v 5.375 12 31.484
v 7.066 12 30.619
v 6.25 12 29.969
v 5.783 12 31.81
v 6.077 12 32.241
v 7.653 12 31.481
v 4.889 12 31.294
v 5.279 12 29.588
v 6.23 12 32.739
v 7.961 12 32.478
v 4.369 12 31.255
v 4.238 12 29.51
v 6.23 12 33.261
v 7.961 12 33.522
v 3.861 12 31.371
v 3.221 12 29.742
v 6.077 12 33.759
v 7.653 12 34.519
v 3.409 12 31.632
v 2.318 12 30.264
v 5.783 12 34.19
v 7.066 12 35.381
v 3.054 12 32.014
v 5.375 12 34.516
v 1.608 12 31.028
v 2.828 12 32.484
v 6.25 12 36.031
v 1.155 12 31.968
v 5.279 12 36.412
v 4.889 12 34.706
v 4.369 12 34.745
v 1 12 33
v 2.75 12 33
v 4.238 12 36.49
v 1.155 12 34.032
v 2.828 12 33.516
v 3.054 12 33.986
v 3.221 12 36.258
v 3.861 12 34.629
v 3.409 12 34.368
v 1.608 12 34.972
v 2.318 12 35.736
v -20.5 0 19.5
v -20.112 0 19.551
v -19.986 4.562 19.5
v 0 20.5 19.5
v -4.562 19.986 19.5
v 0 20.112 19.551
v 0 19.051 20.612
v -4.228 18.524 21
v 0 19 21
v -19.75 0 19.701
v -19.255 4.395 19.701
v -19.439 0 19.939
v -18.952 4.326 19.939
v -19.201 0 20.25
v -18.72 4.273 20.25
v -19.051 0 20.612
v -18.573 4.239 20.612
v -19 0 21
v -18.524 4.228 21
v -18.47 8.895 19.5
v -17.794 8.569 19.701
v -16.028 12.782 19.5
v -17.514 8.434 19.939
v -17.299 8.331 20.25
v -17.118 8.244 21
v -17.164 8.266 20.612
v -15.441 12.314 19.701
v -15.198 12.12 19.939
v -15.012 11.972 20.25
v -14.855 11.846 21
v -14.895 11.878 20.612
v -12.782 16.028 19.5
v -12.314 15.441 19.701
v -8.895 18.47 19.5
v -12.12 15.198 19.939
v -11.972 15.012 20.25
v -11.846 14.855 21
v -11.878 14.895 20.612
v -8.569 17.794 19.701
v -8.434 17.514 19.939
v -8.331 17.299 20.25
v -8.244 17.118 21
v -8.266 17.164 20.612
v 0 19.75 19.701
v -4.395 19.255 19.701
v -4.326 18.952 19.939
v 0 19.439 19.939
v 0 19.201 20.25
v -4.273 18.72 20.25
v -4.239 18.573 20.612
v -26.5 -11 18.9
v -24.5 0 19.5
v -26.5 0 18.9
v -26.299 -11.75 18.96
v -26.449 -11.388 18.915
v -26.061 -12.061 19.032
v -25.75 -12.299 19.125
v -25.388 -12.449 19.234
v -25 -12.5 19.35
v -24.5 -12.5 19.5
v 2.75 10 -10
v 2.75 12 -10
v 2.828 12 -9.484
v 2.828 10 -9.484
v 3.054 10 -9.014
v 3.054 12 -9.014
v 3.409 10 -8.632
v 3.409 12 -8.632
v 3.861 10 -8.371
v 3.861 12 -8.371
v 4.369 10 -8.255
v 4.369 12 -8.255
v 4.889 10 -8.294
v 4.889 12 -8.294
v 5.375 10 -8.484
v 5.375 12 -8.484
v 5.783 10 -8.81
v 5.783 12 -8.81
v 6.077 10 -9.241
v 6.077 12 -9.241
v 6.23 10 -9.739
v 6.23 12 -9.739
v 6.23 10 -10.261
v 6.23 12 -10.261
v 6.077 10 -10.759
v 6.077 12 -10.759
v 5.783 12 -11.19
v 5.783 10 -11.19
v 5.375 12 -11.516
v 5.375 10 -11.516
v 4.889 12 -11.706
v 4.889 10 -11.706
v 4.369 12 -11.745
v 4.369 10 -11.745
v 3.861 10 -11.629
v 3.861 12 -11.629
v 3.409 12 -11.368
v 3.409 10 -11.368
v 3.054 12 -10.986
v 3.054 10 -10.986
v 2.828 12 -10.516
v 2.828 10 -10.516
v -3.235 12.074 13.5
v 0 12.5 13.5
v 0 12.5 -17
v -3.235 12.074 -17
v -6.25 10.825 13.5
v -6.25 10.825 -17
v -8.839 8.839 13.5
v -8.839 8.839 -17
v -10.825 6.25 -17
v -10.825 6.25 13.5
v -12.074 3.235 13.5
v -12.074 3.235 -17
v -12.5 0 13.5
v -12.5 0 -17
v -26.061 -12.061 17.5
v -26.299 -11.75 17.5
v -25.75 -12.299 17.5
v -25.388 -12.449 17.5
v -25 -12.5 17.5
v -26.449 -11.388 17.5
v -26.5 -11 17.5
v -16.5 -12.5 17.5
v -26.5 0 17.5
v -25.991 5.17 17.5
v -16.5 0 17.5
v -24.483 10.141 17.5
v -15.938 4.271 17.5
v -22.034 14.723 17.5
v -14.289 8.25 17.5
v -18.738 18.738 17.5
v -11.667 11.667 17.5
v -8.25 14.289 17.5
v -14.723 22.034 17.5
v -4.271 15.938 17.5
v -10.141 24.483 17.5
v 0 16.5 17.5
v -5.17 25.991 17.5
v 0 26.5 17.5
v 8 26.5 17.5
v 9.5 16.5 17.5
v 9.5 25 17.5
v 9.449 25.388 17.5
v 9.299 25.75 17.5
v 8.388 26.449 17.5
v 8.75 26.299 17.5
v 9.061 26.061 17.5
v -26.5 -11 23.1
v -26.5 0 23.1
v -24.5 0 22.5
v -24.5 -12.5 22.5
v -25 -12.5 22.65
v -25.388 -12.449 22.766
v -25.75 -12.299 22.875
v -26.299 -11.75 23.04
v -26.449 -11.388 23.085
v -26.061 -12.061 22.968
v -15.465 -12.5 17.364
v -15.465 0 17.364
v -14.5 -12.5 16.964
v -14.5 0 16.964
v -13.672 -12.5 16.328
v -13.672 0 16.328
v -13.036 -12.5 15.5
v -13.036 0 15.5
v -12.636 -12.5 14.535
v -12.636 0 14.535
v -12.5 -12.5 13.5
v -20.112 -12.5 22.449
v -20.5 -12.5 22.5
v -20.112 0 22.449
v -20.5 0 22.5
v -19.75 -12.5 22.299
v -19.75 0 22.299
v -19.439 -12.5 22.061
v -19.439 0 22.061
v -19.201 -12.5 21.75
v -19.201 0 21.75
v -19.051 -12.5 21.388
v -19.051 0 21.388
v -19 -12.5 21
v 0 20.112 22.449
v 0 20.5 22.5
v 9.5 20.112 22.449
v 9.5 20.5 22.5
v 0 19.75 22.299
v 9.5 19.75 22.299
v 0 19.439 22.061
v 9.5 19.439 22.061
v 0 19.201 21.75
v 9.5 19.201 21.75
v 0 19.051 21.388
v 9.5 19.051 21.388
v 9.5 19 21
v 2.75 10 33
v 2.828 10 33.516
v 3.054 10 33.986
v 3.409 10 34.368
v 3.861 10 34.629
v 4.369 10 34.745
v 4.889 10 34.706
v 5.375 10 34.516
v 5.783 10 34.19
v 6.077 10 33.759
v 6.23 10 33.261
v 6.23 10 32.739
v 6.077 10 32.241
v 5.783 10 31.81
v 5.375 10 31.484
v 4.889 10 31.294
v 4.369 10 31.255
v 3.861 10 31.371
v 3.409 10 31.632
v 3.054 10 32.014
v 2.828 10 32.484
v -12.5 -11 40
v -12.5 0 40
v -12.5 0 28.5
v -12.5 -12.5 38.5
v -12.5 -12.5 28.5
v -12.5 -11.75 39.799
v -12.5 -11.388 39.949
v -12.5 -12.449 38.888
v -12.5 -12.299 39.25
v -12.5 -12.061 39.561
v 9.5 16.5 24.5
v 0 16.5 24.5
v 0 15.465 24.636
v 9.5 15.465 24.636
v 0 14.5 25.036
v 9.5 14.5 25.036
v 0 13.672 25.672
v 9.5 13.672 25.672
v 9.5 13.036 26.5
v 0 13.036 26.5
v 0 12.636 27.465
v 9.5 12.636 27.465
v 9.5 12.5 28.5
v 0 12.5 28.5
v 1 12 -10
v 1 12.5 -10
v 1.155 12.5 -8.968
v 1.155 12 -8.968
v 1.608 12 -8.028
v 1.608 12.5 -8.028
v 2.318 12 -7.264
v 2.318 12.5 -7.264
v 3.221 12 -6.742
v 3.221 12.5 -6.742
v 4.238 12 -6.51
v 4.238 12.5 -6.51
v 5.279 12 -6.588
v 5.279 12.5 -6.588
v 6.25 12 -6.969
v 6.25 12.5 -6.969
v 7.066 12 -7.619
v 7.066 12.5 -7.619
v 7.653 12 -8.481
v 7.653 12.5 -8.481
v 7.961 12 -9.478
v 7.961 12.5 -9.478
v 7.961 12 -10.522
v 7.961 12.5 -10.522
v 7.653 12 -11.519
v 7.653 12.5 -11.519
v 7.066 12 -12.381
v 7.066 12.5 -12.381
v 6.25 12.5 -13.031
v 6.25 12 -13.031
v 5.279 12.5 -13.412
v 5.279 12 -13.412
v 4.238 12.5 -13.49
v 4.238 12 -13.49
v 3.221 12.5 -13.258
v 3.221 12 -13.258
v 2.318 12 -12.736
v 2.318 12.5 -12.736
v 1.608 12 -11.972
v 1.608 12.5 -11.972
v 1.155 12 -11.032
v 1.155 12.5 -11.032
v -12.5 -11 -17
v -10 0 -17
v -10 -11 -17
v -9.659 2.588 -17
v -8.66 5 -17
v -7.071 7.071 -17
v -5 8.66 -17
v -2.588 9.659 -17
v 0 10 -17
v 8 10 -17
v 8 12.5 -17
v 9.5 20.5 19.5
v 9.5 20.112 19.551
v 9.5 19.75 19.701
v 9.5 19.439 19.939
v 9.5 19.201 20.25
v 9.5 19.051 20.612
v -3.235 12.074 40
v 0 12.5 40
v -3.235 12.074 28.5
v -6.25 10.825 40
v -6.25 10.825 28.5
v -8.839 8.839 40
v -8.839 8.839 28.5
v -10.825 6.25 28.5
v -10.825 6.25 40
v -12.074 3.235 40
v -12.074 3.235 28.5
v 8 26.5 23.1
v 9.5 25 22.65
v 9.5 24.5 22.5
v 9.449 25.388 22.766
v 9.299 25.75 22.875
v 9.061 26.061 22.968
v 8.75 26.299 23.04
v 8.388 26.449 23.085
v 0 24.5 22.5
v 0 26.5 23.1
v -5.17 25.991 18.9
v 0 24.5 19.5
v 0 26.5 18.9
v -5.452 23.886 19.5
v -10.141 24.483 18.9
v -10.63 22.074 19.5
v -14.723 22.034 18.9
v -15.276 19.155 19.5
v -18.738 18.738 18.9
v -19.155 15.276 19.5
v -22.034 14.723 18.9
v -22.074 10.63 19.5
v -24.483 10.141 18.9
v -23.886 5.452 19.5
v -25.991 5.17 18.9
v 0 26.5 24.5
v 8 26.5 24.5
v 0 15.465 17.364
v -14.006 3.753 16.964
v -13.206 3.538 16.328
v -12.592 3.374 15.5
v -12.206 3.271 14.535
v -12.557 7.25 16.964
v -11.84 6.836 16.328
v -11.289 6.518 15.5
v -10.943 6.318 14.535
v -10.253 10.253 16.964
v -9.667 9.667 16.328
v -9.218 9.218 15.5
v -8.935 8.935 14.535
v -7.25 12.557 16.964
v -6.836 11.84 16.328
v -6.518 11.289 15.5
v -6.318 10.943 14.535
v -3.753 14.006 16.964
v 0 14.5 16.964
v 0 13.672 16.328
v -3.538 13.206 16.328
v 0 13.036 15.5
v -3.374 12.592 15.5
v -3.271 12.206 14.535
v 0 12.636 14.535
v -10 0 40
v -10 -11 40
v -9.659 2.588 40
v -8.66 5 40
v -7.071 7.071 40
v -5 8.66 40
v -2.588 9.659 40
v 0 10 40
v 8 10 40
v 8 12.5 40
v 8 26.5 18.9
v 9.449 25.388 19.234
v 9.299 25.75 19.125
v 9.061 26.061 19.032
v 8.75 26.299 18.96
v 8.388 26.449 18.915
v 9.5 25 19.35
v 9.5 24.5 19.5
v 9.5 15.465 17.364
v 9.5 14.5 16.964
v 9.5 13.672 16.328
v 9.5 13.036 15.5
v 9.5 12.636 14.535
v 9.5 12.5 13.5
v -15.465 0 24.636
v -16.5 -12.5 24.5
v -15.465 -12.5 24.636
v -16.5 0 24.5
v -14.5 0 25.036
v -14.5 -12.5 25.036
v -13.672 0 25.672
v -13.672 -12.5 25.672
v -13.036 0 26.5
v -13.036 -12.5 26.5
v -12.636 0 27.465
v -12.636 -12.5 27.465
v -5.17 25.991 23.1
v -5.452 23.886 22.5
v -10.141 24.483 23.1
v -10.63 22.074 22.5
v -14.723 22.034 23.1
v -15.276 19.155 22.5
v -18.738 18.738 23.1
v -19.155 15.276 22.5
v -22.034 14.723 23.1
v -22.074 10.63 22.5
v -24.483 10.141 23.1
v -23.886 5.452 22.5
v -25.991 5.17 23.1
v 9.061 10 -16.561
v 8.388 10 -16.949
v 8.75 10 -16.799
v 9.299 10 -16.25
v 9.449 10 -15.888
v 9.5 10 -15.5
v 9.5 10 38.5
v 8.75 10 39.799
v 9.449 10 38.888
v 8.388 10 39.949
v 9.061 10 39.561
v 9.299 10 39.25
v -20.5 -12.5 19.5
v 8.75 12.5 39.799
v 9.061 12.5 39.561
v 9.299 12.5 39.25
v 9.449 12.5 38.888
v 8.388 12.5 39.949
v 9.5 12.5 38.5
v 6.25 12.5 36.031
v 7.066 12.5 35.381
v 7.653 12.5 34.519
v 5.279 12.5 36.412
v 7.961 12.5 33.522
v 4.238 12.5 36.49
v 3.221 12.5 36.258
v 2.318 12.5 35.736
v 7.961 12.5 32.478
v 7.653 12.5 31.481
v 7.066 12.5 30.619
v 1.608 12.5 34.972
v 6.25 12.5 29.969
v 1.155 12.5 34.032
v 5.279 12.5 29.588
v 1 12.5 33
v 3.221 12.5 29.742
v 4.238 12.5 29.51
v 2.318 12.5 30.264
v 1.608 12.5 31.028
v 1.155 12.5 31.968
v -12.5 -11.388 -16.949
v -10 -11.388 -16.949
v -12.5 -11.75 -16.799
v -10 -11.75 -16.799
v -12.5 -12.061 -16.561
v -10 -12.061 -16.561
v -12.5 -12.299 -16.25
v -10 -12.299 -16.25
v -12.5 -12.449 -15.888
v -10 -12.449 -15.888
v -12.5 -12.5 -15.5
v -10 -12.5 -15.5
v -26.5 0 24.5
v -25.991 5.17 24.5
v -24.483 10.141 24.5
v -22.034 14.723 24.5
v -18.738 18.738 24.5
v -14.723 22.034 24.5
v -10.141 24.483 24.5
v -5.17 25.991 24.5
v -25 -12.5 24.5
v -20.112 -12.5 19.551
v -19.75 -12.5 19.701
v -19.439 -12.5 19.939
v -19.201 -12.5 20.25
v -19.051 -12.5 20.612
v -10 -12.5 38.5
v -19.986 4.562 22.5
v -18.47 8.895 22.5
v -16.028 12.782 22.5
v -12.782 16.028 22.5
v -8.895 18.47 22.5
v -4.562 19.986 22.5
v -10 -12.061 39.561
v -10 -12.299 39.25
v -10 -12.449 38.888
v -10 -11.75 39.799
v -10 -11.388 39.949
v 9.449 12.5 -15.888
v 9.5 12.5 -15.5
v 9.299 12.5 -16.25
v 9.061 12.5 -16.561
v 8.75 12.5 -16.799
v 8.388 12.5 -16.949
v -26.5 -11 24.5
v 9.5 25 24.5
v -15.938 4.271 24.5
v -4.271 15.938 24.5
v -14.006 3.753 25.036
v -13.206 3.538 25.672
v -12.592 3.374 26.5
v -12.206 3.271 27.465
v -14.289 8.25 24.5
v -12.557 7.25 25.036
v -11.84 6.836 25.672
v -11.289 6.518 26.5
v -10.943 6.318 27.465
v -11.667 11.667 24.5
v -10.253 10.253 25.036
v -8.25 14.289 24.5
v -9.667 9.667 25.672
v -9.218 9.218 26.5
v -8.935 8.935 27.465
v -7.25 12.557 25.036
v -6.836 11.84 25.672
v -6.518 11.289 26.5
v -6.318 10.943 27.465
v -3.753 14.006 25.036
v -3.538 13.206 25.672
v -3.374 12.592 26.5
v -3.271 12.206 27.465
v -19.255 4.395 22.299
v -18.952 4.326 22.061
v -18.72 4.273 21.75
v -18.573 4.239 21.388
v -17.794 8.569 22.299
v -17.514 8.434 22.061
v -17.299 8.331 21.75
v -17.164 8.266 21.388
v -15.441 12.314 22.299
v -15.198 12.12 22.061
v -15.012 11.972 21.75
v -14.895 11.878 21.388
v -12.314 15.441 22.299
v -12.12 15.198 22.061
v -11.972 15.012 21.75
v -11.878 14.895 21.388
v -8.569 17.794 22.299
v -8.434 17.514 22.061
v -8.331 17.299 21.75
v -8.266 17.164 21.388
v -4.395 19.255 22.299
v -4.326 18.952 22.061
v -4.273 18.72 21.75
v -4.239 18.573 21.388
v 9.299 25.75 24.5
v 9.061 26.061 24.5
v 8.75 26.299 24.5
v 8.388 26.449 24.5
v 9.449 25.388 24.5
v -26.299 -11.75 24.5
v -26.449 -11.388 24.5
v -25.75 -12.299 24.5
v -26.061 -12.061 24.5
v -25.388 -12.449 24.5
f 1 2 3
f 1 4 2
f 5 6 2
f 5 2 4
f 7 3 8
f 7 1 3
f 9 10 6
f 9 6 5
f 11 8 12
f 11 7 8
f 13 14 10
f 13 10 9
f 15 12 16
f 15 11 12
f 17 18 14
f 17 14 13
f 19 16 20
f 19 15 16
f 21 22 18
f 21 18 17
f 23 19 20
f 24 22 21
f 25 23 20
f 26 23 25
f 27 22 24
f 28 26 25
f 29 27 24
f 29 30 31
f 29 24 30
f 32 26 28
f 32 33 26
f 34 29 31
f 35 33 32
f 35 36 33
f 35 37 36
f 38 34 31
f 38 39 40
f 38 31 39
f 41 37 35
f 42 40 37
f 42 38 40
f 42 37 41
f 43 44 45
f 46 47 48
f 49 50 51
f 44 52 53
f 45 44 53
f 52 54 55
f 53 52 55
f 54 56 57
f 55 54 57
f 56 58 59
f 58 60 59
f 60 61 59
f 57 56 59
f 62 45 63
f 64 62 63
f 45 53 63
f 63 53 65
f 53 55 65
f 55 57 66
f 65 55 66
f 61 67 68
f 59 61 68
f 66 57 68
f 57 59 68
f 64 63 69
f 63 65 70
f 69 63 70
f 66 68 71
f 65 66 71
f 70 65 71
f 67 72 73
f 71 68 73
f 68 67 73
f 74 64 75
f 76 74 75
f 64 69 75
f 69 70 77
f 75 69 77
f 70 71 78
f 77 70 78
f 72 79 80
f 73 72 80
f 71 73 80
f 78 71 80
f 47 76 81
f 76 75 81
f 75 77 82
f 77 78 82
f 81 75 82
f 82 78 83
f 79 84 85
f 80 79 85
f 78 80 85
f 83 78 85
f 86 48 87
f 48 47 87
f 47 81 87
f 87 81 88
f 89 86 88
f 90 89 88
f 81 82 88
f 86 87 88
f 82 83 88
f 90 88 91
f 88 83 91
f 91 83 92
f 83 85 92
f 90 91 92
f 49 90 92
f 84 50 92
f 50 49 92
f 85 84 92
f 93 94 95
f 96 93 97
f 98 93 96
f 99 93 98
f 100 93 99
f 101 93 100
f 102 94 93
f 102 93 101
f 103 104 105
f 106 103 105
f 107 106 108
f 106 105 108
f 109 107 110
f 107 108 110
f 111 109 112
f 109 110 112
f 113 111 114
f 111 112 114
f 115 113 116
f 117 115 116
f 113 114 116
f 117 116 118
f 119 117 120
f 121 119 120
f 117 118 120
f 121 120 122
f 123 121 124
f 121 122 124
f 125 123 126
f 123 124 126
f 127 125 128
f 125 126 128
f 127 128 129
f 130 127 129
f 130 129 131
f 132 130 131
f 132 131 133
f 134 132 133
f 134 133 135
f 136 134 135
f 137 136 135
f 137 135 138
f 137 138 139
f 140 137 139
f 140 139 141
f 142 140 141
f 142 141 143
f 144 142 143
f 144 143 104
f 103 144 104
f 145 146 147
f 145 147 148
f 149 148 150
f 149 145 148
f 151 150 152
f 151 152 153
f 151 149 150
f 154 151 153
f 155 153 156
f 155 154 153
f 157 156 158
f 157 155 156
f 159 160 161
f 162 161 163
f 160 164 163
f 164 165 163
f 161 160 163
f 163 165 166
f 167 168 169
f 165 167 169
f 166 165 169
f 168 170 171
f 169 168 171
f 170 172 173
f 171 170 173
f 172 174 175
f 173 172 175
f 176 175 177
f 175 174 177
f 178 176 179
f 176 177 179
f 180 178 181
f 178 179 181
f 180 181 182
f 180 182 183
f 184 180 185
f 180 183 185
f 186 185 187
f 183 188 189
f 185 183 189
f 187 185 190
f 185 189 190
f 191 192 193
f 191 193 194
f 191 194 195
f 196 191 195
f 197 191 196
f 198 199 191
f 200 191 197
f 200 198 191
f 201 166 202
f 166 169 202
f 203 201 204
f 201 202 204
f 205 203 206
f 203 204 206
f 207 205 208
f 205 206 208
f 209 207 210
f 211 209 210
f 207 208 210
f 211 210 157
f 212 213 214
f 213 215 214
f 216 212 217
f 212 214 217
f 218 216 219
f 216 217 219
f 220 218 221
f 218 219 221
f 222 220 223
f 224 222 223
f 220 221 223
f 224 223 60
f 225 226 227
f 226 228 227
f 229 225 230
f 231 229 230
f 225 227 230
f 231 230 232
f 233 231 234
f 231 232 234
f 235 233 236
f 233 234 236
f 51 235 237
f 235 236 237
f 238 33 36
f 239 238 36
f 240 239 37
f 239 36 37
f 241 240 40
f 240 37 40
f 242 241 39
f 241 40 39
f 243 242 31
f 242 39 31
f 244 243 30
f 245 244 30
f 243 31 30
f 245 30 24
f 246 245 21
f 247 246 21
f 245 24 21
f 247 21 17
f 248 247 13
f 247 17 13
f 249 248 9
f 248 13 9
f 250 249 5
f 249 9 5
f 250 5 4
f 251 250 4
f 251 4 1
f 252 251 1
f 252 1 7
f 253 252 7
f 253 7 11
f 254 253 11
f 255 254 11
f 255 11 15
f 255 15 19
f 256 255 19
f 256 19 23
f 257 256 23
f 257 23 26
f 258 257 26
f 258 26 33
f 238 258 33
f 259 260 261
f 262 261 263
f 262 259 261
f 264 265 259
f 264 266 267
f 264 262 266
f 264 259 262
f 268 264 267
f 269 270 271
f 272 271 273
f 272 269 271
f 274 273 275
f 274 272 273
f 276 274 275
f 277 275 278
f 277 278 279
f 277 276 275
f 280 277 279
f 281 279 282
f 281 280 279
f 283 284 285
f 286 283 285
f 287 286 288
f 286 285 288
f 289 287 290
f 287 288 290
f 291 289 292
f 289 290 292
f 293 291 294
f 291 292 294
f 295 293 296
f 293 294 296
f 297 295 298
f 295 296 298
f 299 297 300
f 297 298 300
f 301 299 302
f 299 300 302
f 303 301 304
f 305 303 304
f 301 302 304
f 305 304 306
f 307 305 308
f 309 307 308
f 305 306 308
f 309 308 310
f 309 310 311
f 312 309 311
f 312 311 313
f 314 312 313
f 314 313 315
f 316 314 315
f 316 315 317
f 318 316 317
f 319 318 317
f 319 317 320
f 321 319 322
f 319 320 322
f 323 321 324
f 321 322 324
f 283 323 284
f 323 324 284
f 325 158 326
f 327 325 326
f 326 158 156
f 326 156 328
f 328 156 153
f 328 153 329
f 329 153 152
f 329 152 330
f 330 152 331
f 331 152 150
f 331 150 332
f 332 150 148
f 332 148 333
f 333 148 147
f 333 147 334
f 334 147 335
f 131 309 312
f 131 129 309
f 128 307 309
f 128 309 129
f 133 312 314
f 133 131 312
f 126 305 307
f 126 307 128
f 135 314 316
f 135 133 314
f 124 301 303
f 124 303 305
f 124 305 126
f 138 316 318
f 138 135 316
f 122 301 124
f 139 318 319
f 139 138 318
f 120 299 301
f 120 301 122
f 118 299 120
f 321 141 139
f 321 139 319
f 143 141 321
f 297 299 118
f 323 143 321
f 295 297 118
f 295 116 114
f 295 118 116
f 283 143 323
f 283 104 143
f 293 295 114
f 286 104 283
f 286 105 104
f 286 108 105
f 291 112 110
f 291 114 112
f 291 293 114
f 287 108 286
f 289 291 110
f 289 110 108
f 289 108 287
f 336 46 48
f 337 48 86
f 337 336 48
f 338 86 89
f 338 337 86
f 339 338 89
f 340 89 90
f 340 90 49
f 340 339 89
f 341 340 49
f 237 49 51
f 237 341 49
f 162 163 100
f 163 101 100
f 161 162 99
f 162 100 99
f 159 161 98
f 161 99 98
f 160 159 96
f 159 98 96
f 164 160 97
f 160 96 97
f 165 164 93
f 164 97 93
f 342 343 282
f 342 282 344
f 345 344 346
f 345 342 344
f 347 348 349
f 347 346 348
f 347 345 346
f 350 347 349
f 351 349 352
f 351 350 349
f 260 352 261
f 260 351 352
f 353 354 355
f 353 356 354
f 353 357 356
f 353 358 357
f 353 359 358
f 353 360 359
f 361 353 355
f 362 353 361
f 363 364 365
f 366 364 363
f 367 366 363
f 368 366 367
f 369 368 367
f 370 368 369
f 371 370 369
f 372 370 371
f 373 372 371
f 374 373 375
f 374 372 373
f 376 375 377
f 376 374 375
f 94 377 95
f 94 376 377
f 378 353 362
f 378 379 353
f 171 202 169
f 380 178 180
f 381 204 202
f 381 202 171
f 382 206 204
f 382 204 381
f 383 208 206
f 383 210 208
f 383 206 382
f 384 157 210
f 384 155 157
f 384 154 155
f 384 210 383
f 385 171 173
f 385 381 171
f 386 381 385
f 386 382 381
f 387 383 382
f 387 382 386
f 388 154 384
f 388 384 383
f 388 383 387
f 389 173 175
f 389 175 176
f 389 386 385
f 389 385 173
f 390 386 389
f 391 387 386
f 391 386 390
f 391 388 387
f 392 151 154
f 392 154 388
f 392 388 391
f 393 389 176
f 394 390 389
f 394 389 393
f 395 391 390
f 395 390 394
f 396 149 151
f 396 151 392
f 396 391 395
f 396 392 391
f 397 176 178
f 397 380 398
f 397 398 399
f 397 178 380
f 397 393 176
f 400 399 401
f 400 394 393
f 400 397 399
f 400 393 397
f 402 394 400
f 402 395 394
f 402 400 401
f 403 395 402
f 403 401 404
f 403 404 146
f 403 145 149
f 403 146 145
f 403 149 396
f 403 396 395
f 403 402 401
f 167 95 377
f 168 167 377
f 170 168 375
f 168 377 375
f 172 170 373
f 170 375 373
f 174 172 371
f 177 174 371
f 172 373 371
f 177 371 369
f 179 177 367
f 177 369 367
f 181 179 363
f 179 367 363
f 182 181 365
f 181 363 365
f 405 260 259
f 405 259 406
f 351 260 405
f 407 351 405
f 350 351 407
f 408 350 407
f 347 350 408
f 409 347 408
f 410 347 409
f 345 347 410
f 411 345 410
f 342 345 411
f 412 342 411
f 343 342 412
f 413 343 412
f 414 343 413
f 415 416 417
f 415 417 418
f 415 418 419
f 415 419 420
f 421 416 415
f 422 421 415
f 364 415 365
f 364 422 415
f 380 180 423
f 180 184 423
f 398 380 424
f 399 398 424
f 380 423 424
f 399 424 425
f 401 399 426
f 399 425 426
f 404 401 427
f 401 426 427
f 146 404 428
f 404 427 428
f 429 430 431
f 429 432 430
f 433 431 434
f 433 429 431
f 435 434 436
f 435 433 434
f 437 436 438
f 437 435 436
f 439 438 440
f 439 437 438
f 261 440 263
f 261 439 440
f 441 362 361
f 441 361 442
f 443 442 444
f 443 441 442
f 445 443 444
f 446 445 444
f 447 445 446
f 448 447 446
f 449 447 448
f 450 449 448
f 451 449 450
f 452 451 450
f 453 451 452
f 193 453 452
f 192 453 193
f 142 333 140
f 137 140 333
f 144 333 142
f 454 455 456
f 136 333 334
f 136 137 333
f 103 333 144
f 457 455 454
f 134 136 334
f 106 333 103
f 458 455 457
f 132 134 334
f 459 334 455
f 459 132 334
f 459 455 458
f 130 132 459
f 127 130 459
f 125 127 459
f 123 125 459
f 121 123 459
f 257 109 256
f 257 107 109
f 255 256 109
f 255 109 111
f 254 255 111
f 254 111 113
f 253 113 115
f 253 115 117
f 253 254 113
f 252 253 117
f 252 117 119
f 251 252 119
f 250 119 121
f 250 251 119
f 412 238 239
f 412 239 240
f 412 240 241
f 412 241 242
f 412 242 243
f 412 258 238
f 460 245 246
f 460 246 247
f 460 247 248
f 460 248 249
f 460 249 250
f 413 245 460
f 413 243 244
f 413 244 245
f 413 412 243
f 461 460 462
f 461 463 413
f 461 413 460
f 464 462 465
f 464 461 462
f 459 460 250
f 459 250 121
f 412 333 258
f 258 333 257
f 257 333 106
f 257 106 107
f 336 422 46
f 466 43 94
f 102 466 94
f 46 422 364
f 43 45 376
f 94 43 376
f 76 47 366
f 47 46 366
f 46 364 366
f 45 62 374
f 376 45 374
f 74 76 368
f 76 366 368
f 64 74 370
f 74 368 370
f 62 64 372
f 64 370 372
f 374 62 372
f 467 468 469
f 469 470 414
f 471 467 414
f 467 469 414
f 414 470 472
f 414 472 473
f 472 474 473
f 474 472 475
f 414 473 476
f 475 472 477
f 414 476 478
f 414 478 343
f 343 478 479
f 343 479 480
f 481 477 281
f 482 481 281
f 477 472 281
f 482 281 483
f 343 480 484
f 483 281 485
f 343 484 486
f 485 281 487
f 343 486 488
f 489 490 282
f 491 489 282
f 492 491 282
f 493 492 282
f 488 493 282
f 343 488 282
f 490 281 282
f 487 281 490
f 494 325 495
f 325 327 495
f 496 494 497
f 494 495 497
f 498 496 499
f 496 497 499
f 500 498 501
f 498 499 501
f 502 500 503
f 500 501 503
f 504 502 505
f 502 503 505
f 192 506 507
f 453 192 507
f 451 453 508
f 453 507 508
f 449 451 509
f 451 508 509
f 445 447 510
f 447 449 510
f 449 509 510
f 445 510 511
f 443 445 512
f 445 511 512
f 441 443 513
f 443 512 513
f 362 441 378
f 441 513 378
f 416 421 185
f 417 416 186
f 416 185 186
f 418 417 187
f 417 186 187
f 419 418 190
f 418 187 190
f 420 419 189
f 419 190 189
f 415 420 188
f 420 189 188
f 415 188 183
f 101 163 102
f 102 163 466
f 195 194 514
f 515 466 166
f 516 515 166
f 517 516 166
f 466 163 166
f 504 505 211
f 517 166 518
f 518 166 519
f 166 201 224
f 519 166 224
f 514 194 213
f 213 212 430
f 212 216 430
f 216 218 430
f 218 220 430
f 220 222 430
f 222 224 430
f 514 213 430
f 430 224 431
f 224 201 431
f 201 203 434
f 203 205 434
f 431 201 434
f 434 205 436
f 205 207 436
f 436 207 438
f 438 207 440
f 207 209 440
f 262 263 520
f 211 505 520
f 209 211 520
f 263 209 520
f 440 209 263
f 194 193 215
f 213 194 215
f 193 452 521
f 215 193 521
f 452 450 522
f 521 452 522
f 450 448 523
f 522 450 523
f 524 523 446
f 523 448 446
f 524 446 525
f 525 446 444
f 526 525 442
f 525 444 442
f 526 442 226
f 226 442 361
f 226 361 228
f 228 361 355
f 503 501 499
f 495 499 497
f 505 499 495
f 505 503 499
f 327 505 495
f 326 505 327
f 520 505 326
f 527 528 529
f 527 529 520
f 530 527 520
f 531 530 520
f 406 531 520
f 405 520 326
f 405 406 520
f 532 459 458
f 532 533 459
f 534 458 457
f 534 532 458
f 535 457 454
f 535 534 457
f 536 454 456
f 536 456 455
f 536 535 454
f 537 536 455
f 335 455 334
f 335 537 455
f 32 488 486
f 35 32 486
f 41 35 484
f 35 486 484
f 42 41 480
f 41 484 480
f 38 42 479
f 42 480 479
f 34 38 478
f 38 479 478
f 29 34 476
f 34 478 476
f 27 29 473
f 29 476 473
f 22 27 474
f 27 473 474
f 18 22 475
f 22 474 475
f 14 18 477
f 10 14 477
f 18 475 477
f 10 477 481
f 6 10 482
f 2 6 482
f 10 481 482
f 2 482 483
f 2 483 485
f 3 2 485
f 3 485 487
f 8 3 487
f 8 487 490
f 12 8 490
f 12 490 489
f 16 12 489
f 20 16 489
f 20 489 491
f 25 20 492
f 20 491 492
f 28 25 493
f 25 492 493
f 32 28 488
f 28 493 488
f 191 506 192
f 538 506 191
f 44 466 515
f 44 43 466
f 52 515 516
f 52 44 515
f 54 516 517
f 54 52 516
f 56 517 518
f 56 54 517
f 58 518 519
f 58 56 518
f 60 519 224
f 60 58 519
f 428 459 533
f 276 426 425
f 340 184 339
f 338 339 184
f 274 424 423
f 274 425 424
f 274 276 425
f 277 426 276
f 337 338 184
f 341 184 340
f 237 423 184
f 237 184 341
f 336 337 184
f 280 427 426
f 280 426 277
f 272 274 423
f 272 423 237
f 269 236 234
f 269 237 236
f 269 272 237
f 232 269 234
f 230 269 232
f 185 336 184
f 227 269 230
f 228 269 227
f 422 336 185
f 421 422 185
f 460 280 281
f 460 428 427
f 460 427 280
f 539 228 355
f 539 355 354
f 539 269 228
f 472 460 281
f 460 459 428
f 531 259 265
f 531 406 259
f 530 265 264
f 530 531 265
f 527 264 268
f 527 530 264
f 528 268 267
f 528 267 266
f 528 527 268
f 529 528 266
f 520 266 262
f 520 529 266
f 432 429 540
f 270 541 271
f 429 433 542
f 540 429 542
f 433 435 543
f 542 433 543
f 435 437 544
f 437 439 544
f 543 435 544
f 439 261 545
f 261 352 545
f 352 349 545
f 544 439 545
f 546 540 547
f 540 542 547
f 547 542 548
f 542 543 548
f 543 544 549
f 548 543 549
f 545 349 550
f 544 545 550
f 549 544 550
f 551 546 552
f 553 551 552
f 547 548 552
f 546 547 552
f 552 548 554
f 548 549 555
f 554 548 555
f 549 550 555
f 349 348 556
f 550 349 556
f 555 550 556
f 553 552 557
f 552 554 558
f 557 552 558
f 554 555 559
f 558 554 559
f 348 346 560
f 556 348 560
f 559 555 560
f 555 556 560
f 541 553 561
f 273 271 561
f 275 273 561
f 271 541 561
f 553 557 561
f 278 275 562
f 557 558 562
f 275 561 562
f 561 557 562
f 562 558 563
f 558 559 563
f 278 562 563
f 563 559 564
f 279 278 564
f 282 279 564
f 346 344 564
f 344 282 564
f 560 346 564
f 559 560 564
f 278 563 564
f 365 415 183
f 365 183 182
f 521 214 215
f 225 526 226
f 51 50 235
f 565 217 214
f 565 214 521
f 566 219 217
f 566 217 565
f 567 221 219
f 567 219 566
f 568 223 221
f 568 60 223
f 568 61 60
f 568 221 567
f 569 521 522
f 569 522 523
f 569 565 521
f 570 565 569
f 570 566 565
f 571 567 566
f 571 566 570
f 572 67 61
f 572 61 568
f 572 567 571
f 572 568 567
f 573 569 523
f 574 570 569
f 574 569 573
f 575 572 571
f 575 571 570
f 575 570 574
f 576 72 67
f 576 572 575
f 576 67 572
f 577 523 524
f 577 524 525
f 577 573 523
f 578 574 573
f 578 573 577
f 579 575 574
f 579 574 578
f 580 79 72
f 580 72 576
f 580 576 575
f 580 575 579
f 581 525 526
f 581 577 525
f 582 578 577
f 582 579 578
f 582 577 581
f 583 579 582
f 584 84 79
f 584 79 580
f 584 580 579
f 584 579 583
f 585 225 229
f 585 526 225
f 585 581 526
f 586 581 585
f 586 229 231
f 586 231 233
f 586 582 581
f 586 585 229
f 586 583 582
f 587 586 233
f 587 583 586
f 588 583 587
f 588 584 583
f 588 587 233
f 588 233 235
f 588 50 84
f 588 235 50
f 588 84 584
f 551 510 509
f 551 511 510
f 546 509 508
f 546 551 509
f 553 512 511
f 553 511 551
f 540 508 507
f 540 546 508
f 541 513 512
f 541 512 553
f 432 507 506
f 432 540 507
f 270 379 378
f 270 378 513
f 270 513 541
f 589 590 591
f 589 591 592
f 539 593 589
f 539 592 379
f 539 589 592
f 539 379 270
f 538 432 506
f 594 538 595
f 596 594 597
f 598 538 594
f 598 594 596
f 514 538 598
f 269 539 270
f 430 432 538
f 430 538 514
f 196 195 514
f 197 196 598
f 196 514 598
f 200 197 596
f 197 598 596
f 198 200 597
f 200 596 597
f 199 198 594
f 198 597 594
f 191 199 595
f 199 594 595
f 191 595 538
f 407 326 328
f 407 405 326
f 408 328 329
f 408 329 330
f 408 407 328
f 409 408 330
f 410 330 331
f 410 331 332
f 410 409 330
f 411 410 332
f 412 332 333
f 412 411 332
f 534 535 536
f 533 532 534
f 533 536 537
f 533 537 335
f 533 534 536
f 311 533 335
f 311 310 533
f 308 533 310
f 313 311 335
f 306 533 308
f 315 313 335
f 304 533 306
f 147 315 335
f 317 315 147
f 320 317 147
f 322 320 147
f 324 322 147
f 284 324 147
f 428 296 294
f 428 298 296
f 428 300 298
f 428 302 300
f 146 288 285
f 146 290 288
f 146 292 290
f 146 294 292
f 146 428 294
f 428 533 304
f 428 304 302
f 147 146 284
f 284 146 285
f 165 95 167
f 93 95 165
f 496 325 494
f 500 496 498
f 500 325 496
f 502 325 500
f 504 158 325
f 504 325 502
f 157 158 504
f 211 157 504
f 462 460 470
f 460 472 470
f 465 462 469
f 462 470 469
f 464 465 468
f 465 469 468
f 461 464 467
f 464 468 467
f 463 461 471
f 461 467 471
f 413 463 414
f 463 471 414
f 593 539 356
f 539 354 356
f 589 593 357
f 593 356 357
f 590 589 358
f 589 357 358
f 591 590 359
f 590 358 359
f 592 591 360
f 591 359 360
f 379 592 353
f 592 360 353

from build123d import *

# Parameters (mm, degrees)
F1_DEPTH  = 40
F3_DEPTH  = 6.5
F4_DEPTH  = 14
F5_R      = 3.5
F5_R_2    = 1.75
F6_DEPTH  = 0.5
F7_DEPTH  = 25
F8_DEPTH  = 17
F9_R      = 1.75
F10_DEPTH = 3
F9_R_2    = 3.5
F11_DEPTH = 0.5
F12_W     = 12.5
F12_H     = 3
F13_DEPTH = 6.5
F12_H_2   = 2
F14_DEPTH = 14
F15_ANGLE = 90
F16_R     = 4
F17_SIZE2 = 2
F17_SIZE  = 0.6
F18_SIZE2 = 0.6
F18_SIZE  = 2
F19_R     = 1.49999


# Not quite as in the source:
# - a fillet or chamfer is up to 0.001 mm smaller than in the source, because OpenCascade refuses the exact size


with BuildPart() as f1:
    # F0 (on Top) → F1 (new body)
    with BuildSketch(Plane.XY):
        with BuildLine():
            ThreePointArc((-10, 0), (-7.0710678119, 7.0710678119), (0, 10))
            Line((0, 10), (9.5, 10))
            Line((9.5, 10), (9.5, 12.5))
            Line((9.5, 12.5), (0, 12.5))
            ThreePointArc((0, 12.5), (-8.8388347648, 8.8388347648), (-12.5, 0))
            Line((-12.5, 0), (-12.5, -12.5))
            Line((-12.5, -12.5), (-10, -12.5))
            Line((-10, -12.5), (-10, 0))
        make_face()
    extrude(amount=F1_DEPTH)

    # F2 (on face) → F3 (join)
    with BuildSketch(Plane(origin=(0, 12.5, 0), x_dir=(-1, 0, 0), z_dir=(0, 1, 0))):
        Polygon((-5.7388888672, 22.5), (-9.5, 22.5), (-9.5, 19.5), (-5.7327155955, 19.5), (0, 19.5), (0, 22.5), align=None)
    extrude(amount=F3_DEPTH)

    # F2 (on face) → F4 (join)
    with BuildSketch(Plane(origin=(0, 12.5, 0), x_dir=(-1, 0, 0), z_dir=(0, 1, 0))):
        Polygon((-5.7188421488, 24.5), (-9.5, 24.5), (-9.5, 22.5), (-5.7388888672, 22.5), (0, 22.5), (0, 24.5), align=None)
        Polygon((-5.7327155955, 19.5), (-9.5, 19.5), (-9.5, 17.5), (-5.7445626465, 17.5), (0, 17.5), (0, 19.5), align=None)
    extrude(amount=F4_DEPTH)

    # F5 (on face) → F6 (cut)
    with BuildSketch(Plane(origin=(0, 12.5, 0), x_dir=(-1, 0, 0), z_dir=(0, 1, 0))):
        with Locations((-4.5, 33)):
            Circle(F5_R)
        with Locations((-4.5, 33)):
            Circle(F5_R_2, mode=Mode.SUBTRACT)
    extrude(amount=-F6_DEPTH, mode=Mode.SUBTRACT)

    # F5 (on face) → F7 (cut)
    with BuildSketch(Plane(origin=(0, 12.5, 0), x_dir=(-1, 0, 0), z_dir=(0, 1, 0))):
        with Locations((-4.5, 33)):
            Circle(F5_R_2)
    extrude(amount=-F7_DEPTH, mode=Mode.SUBTRACT)

    # F8 (add): a face of the model
    f8_faces = [f1.faces().sort_by_distance(p)[0] for p in [
        (-7.3065460487, 7.3065460487, 0),
    ]]
    extrude(f8_faces, amount=F8_DEPTH)

    # F9 (on face) → F10 (cut)
    with BuildSketch(Plane(origin=(0, 12.5, 0), x_dir=(-1, 0, 0), z_dir=(0, 1, 0))):
        with Locations((-4.5, -10)):
            Circle(F9_R)
    extrude(amount=-F10_DEPTH, mode=Mode.SUBTRACT)

    # F9 (on face) → F11 (cut)
    with BuildSketch(Plane(origin=(0, 12.5, 0), x_dir=(-1, 0, 0), z_dir=(0, 1, 0))):
        with Locations((-4.5, -10)):
            Circle(F9_R_2)
        with Locations((-4.5, -10)):
            Circle(F9_R, mode=Mode.SUBTRACT)
    extrude(amount=-F11_DEPTH, mode=Mode.SUBTRACT)

    # F12 (on face) → F13 (join)
    with BuildSketch(Plane(origin=(-12.5, 0, 0), x_dir=(0, -1, 0), z_dir=(-1, 0, 0))):
        with Locations((6.25, 21)):
            Rectangle(F12_W, F12_H)
    extrude(amount=F13_DEPTH)

    # F12 (on face) → F14 (join)
    with BuildSketch(Plane(origin=(-12.5, 0, 0), x_dir=(0, -1, 0), z_dir=(-1, 0, 0))):
        with Locations((6.25, 23.5)):
            Rectangle(F12_W, F12_H_2)
        with Locations((6.25, 18.5)):
            Rectangle(F12_W, F12_H_2)
    extrude(amount=F14_DEPTH)

    # F14_face (on face) → F15 (revolve)
    with BuildSketch(Plane(origin=(-18.5314569536, 0, 21), x_dir=(-1, 0, 0), z_dir=(0, 1, 0))):
        Polygon((7.9685430464, -1.5), (0.4685430464, -1.5), (0.4685430464, 1.5), (7.9685430464, 1.5), (7.9685430464, 3.5), (-6.0314569536, 3.5), (-6.0314569536, -3.5), (7.9685430464, -3.5), align=None)
    revolve(axis=Axis((0, 0, 0), (0, 0, -1)), revolution_arc=F15_ANGLE)

    # F16
    f16_edges = [f1.edges().sort_by_distance(p)[0] for p in [
        (-8.838835, 8.838835, 17.5),
        (-8.838835, 8.838835, 24.5),
    ]]
    fillet(f16_edges, radius=F16_R)

    # F17
    f17_edges = [f1.edges().sort_by_distance(p)[0] for p in [
        (-26.5, -6.25, 19.5),
    ]]
    f17_side = f1.faces().sort_by_distance((-26.5, -6.25, 18.5))[0]
    chamfer(f17_edges, length=F17_SIZE, length2=F17_SIZE2, reference=f17_side)

    # F18
    f18_edges = [f1.edges().sort_by_distance(p)[0] for p in [
        (-26.5, -6.25, 22.5),
    ]]
    f18_side = f1.faces().sort_by_distance((-19.530754, -6.25, 22.5))[0]
    chamfer(f18_edges, length=F18_SIZE, length2=F18_SIZE2, reference=f18_side)

    # F19 (radius 1.5 in the source; OpenCascade refuses exactly that, so slightly less here)
    f19_edges = [f1.edges().sort_by_distance(p)[0] for p in [
        (-13.435029, 13.435029, 19.5),
        (-13.435029, 13.435029, 22.5),
        (9.5, 26.5, 23.8),
        (9.5, 26.5, 18.2),
        (-26.5, -12.5, 18.2),
        (-26.5, -12.5, 23.8),
        (-11.25, -12.5, 40),
        (9.5, 11.25, 40),
        (9.5, 11.25, -17),
        (-11.25, -12.5, -17),
    ]]
    fillet(f19_edges, radius=F19_R)


solid = f1.part
